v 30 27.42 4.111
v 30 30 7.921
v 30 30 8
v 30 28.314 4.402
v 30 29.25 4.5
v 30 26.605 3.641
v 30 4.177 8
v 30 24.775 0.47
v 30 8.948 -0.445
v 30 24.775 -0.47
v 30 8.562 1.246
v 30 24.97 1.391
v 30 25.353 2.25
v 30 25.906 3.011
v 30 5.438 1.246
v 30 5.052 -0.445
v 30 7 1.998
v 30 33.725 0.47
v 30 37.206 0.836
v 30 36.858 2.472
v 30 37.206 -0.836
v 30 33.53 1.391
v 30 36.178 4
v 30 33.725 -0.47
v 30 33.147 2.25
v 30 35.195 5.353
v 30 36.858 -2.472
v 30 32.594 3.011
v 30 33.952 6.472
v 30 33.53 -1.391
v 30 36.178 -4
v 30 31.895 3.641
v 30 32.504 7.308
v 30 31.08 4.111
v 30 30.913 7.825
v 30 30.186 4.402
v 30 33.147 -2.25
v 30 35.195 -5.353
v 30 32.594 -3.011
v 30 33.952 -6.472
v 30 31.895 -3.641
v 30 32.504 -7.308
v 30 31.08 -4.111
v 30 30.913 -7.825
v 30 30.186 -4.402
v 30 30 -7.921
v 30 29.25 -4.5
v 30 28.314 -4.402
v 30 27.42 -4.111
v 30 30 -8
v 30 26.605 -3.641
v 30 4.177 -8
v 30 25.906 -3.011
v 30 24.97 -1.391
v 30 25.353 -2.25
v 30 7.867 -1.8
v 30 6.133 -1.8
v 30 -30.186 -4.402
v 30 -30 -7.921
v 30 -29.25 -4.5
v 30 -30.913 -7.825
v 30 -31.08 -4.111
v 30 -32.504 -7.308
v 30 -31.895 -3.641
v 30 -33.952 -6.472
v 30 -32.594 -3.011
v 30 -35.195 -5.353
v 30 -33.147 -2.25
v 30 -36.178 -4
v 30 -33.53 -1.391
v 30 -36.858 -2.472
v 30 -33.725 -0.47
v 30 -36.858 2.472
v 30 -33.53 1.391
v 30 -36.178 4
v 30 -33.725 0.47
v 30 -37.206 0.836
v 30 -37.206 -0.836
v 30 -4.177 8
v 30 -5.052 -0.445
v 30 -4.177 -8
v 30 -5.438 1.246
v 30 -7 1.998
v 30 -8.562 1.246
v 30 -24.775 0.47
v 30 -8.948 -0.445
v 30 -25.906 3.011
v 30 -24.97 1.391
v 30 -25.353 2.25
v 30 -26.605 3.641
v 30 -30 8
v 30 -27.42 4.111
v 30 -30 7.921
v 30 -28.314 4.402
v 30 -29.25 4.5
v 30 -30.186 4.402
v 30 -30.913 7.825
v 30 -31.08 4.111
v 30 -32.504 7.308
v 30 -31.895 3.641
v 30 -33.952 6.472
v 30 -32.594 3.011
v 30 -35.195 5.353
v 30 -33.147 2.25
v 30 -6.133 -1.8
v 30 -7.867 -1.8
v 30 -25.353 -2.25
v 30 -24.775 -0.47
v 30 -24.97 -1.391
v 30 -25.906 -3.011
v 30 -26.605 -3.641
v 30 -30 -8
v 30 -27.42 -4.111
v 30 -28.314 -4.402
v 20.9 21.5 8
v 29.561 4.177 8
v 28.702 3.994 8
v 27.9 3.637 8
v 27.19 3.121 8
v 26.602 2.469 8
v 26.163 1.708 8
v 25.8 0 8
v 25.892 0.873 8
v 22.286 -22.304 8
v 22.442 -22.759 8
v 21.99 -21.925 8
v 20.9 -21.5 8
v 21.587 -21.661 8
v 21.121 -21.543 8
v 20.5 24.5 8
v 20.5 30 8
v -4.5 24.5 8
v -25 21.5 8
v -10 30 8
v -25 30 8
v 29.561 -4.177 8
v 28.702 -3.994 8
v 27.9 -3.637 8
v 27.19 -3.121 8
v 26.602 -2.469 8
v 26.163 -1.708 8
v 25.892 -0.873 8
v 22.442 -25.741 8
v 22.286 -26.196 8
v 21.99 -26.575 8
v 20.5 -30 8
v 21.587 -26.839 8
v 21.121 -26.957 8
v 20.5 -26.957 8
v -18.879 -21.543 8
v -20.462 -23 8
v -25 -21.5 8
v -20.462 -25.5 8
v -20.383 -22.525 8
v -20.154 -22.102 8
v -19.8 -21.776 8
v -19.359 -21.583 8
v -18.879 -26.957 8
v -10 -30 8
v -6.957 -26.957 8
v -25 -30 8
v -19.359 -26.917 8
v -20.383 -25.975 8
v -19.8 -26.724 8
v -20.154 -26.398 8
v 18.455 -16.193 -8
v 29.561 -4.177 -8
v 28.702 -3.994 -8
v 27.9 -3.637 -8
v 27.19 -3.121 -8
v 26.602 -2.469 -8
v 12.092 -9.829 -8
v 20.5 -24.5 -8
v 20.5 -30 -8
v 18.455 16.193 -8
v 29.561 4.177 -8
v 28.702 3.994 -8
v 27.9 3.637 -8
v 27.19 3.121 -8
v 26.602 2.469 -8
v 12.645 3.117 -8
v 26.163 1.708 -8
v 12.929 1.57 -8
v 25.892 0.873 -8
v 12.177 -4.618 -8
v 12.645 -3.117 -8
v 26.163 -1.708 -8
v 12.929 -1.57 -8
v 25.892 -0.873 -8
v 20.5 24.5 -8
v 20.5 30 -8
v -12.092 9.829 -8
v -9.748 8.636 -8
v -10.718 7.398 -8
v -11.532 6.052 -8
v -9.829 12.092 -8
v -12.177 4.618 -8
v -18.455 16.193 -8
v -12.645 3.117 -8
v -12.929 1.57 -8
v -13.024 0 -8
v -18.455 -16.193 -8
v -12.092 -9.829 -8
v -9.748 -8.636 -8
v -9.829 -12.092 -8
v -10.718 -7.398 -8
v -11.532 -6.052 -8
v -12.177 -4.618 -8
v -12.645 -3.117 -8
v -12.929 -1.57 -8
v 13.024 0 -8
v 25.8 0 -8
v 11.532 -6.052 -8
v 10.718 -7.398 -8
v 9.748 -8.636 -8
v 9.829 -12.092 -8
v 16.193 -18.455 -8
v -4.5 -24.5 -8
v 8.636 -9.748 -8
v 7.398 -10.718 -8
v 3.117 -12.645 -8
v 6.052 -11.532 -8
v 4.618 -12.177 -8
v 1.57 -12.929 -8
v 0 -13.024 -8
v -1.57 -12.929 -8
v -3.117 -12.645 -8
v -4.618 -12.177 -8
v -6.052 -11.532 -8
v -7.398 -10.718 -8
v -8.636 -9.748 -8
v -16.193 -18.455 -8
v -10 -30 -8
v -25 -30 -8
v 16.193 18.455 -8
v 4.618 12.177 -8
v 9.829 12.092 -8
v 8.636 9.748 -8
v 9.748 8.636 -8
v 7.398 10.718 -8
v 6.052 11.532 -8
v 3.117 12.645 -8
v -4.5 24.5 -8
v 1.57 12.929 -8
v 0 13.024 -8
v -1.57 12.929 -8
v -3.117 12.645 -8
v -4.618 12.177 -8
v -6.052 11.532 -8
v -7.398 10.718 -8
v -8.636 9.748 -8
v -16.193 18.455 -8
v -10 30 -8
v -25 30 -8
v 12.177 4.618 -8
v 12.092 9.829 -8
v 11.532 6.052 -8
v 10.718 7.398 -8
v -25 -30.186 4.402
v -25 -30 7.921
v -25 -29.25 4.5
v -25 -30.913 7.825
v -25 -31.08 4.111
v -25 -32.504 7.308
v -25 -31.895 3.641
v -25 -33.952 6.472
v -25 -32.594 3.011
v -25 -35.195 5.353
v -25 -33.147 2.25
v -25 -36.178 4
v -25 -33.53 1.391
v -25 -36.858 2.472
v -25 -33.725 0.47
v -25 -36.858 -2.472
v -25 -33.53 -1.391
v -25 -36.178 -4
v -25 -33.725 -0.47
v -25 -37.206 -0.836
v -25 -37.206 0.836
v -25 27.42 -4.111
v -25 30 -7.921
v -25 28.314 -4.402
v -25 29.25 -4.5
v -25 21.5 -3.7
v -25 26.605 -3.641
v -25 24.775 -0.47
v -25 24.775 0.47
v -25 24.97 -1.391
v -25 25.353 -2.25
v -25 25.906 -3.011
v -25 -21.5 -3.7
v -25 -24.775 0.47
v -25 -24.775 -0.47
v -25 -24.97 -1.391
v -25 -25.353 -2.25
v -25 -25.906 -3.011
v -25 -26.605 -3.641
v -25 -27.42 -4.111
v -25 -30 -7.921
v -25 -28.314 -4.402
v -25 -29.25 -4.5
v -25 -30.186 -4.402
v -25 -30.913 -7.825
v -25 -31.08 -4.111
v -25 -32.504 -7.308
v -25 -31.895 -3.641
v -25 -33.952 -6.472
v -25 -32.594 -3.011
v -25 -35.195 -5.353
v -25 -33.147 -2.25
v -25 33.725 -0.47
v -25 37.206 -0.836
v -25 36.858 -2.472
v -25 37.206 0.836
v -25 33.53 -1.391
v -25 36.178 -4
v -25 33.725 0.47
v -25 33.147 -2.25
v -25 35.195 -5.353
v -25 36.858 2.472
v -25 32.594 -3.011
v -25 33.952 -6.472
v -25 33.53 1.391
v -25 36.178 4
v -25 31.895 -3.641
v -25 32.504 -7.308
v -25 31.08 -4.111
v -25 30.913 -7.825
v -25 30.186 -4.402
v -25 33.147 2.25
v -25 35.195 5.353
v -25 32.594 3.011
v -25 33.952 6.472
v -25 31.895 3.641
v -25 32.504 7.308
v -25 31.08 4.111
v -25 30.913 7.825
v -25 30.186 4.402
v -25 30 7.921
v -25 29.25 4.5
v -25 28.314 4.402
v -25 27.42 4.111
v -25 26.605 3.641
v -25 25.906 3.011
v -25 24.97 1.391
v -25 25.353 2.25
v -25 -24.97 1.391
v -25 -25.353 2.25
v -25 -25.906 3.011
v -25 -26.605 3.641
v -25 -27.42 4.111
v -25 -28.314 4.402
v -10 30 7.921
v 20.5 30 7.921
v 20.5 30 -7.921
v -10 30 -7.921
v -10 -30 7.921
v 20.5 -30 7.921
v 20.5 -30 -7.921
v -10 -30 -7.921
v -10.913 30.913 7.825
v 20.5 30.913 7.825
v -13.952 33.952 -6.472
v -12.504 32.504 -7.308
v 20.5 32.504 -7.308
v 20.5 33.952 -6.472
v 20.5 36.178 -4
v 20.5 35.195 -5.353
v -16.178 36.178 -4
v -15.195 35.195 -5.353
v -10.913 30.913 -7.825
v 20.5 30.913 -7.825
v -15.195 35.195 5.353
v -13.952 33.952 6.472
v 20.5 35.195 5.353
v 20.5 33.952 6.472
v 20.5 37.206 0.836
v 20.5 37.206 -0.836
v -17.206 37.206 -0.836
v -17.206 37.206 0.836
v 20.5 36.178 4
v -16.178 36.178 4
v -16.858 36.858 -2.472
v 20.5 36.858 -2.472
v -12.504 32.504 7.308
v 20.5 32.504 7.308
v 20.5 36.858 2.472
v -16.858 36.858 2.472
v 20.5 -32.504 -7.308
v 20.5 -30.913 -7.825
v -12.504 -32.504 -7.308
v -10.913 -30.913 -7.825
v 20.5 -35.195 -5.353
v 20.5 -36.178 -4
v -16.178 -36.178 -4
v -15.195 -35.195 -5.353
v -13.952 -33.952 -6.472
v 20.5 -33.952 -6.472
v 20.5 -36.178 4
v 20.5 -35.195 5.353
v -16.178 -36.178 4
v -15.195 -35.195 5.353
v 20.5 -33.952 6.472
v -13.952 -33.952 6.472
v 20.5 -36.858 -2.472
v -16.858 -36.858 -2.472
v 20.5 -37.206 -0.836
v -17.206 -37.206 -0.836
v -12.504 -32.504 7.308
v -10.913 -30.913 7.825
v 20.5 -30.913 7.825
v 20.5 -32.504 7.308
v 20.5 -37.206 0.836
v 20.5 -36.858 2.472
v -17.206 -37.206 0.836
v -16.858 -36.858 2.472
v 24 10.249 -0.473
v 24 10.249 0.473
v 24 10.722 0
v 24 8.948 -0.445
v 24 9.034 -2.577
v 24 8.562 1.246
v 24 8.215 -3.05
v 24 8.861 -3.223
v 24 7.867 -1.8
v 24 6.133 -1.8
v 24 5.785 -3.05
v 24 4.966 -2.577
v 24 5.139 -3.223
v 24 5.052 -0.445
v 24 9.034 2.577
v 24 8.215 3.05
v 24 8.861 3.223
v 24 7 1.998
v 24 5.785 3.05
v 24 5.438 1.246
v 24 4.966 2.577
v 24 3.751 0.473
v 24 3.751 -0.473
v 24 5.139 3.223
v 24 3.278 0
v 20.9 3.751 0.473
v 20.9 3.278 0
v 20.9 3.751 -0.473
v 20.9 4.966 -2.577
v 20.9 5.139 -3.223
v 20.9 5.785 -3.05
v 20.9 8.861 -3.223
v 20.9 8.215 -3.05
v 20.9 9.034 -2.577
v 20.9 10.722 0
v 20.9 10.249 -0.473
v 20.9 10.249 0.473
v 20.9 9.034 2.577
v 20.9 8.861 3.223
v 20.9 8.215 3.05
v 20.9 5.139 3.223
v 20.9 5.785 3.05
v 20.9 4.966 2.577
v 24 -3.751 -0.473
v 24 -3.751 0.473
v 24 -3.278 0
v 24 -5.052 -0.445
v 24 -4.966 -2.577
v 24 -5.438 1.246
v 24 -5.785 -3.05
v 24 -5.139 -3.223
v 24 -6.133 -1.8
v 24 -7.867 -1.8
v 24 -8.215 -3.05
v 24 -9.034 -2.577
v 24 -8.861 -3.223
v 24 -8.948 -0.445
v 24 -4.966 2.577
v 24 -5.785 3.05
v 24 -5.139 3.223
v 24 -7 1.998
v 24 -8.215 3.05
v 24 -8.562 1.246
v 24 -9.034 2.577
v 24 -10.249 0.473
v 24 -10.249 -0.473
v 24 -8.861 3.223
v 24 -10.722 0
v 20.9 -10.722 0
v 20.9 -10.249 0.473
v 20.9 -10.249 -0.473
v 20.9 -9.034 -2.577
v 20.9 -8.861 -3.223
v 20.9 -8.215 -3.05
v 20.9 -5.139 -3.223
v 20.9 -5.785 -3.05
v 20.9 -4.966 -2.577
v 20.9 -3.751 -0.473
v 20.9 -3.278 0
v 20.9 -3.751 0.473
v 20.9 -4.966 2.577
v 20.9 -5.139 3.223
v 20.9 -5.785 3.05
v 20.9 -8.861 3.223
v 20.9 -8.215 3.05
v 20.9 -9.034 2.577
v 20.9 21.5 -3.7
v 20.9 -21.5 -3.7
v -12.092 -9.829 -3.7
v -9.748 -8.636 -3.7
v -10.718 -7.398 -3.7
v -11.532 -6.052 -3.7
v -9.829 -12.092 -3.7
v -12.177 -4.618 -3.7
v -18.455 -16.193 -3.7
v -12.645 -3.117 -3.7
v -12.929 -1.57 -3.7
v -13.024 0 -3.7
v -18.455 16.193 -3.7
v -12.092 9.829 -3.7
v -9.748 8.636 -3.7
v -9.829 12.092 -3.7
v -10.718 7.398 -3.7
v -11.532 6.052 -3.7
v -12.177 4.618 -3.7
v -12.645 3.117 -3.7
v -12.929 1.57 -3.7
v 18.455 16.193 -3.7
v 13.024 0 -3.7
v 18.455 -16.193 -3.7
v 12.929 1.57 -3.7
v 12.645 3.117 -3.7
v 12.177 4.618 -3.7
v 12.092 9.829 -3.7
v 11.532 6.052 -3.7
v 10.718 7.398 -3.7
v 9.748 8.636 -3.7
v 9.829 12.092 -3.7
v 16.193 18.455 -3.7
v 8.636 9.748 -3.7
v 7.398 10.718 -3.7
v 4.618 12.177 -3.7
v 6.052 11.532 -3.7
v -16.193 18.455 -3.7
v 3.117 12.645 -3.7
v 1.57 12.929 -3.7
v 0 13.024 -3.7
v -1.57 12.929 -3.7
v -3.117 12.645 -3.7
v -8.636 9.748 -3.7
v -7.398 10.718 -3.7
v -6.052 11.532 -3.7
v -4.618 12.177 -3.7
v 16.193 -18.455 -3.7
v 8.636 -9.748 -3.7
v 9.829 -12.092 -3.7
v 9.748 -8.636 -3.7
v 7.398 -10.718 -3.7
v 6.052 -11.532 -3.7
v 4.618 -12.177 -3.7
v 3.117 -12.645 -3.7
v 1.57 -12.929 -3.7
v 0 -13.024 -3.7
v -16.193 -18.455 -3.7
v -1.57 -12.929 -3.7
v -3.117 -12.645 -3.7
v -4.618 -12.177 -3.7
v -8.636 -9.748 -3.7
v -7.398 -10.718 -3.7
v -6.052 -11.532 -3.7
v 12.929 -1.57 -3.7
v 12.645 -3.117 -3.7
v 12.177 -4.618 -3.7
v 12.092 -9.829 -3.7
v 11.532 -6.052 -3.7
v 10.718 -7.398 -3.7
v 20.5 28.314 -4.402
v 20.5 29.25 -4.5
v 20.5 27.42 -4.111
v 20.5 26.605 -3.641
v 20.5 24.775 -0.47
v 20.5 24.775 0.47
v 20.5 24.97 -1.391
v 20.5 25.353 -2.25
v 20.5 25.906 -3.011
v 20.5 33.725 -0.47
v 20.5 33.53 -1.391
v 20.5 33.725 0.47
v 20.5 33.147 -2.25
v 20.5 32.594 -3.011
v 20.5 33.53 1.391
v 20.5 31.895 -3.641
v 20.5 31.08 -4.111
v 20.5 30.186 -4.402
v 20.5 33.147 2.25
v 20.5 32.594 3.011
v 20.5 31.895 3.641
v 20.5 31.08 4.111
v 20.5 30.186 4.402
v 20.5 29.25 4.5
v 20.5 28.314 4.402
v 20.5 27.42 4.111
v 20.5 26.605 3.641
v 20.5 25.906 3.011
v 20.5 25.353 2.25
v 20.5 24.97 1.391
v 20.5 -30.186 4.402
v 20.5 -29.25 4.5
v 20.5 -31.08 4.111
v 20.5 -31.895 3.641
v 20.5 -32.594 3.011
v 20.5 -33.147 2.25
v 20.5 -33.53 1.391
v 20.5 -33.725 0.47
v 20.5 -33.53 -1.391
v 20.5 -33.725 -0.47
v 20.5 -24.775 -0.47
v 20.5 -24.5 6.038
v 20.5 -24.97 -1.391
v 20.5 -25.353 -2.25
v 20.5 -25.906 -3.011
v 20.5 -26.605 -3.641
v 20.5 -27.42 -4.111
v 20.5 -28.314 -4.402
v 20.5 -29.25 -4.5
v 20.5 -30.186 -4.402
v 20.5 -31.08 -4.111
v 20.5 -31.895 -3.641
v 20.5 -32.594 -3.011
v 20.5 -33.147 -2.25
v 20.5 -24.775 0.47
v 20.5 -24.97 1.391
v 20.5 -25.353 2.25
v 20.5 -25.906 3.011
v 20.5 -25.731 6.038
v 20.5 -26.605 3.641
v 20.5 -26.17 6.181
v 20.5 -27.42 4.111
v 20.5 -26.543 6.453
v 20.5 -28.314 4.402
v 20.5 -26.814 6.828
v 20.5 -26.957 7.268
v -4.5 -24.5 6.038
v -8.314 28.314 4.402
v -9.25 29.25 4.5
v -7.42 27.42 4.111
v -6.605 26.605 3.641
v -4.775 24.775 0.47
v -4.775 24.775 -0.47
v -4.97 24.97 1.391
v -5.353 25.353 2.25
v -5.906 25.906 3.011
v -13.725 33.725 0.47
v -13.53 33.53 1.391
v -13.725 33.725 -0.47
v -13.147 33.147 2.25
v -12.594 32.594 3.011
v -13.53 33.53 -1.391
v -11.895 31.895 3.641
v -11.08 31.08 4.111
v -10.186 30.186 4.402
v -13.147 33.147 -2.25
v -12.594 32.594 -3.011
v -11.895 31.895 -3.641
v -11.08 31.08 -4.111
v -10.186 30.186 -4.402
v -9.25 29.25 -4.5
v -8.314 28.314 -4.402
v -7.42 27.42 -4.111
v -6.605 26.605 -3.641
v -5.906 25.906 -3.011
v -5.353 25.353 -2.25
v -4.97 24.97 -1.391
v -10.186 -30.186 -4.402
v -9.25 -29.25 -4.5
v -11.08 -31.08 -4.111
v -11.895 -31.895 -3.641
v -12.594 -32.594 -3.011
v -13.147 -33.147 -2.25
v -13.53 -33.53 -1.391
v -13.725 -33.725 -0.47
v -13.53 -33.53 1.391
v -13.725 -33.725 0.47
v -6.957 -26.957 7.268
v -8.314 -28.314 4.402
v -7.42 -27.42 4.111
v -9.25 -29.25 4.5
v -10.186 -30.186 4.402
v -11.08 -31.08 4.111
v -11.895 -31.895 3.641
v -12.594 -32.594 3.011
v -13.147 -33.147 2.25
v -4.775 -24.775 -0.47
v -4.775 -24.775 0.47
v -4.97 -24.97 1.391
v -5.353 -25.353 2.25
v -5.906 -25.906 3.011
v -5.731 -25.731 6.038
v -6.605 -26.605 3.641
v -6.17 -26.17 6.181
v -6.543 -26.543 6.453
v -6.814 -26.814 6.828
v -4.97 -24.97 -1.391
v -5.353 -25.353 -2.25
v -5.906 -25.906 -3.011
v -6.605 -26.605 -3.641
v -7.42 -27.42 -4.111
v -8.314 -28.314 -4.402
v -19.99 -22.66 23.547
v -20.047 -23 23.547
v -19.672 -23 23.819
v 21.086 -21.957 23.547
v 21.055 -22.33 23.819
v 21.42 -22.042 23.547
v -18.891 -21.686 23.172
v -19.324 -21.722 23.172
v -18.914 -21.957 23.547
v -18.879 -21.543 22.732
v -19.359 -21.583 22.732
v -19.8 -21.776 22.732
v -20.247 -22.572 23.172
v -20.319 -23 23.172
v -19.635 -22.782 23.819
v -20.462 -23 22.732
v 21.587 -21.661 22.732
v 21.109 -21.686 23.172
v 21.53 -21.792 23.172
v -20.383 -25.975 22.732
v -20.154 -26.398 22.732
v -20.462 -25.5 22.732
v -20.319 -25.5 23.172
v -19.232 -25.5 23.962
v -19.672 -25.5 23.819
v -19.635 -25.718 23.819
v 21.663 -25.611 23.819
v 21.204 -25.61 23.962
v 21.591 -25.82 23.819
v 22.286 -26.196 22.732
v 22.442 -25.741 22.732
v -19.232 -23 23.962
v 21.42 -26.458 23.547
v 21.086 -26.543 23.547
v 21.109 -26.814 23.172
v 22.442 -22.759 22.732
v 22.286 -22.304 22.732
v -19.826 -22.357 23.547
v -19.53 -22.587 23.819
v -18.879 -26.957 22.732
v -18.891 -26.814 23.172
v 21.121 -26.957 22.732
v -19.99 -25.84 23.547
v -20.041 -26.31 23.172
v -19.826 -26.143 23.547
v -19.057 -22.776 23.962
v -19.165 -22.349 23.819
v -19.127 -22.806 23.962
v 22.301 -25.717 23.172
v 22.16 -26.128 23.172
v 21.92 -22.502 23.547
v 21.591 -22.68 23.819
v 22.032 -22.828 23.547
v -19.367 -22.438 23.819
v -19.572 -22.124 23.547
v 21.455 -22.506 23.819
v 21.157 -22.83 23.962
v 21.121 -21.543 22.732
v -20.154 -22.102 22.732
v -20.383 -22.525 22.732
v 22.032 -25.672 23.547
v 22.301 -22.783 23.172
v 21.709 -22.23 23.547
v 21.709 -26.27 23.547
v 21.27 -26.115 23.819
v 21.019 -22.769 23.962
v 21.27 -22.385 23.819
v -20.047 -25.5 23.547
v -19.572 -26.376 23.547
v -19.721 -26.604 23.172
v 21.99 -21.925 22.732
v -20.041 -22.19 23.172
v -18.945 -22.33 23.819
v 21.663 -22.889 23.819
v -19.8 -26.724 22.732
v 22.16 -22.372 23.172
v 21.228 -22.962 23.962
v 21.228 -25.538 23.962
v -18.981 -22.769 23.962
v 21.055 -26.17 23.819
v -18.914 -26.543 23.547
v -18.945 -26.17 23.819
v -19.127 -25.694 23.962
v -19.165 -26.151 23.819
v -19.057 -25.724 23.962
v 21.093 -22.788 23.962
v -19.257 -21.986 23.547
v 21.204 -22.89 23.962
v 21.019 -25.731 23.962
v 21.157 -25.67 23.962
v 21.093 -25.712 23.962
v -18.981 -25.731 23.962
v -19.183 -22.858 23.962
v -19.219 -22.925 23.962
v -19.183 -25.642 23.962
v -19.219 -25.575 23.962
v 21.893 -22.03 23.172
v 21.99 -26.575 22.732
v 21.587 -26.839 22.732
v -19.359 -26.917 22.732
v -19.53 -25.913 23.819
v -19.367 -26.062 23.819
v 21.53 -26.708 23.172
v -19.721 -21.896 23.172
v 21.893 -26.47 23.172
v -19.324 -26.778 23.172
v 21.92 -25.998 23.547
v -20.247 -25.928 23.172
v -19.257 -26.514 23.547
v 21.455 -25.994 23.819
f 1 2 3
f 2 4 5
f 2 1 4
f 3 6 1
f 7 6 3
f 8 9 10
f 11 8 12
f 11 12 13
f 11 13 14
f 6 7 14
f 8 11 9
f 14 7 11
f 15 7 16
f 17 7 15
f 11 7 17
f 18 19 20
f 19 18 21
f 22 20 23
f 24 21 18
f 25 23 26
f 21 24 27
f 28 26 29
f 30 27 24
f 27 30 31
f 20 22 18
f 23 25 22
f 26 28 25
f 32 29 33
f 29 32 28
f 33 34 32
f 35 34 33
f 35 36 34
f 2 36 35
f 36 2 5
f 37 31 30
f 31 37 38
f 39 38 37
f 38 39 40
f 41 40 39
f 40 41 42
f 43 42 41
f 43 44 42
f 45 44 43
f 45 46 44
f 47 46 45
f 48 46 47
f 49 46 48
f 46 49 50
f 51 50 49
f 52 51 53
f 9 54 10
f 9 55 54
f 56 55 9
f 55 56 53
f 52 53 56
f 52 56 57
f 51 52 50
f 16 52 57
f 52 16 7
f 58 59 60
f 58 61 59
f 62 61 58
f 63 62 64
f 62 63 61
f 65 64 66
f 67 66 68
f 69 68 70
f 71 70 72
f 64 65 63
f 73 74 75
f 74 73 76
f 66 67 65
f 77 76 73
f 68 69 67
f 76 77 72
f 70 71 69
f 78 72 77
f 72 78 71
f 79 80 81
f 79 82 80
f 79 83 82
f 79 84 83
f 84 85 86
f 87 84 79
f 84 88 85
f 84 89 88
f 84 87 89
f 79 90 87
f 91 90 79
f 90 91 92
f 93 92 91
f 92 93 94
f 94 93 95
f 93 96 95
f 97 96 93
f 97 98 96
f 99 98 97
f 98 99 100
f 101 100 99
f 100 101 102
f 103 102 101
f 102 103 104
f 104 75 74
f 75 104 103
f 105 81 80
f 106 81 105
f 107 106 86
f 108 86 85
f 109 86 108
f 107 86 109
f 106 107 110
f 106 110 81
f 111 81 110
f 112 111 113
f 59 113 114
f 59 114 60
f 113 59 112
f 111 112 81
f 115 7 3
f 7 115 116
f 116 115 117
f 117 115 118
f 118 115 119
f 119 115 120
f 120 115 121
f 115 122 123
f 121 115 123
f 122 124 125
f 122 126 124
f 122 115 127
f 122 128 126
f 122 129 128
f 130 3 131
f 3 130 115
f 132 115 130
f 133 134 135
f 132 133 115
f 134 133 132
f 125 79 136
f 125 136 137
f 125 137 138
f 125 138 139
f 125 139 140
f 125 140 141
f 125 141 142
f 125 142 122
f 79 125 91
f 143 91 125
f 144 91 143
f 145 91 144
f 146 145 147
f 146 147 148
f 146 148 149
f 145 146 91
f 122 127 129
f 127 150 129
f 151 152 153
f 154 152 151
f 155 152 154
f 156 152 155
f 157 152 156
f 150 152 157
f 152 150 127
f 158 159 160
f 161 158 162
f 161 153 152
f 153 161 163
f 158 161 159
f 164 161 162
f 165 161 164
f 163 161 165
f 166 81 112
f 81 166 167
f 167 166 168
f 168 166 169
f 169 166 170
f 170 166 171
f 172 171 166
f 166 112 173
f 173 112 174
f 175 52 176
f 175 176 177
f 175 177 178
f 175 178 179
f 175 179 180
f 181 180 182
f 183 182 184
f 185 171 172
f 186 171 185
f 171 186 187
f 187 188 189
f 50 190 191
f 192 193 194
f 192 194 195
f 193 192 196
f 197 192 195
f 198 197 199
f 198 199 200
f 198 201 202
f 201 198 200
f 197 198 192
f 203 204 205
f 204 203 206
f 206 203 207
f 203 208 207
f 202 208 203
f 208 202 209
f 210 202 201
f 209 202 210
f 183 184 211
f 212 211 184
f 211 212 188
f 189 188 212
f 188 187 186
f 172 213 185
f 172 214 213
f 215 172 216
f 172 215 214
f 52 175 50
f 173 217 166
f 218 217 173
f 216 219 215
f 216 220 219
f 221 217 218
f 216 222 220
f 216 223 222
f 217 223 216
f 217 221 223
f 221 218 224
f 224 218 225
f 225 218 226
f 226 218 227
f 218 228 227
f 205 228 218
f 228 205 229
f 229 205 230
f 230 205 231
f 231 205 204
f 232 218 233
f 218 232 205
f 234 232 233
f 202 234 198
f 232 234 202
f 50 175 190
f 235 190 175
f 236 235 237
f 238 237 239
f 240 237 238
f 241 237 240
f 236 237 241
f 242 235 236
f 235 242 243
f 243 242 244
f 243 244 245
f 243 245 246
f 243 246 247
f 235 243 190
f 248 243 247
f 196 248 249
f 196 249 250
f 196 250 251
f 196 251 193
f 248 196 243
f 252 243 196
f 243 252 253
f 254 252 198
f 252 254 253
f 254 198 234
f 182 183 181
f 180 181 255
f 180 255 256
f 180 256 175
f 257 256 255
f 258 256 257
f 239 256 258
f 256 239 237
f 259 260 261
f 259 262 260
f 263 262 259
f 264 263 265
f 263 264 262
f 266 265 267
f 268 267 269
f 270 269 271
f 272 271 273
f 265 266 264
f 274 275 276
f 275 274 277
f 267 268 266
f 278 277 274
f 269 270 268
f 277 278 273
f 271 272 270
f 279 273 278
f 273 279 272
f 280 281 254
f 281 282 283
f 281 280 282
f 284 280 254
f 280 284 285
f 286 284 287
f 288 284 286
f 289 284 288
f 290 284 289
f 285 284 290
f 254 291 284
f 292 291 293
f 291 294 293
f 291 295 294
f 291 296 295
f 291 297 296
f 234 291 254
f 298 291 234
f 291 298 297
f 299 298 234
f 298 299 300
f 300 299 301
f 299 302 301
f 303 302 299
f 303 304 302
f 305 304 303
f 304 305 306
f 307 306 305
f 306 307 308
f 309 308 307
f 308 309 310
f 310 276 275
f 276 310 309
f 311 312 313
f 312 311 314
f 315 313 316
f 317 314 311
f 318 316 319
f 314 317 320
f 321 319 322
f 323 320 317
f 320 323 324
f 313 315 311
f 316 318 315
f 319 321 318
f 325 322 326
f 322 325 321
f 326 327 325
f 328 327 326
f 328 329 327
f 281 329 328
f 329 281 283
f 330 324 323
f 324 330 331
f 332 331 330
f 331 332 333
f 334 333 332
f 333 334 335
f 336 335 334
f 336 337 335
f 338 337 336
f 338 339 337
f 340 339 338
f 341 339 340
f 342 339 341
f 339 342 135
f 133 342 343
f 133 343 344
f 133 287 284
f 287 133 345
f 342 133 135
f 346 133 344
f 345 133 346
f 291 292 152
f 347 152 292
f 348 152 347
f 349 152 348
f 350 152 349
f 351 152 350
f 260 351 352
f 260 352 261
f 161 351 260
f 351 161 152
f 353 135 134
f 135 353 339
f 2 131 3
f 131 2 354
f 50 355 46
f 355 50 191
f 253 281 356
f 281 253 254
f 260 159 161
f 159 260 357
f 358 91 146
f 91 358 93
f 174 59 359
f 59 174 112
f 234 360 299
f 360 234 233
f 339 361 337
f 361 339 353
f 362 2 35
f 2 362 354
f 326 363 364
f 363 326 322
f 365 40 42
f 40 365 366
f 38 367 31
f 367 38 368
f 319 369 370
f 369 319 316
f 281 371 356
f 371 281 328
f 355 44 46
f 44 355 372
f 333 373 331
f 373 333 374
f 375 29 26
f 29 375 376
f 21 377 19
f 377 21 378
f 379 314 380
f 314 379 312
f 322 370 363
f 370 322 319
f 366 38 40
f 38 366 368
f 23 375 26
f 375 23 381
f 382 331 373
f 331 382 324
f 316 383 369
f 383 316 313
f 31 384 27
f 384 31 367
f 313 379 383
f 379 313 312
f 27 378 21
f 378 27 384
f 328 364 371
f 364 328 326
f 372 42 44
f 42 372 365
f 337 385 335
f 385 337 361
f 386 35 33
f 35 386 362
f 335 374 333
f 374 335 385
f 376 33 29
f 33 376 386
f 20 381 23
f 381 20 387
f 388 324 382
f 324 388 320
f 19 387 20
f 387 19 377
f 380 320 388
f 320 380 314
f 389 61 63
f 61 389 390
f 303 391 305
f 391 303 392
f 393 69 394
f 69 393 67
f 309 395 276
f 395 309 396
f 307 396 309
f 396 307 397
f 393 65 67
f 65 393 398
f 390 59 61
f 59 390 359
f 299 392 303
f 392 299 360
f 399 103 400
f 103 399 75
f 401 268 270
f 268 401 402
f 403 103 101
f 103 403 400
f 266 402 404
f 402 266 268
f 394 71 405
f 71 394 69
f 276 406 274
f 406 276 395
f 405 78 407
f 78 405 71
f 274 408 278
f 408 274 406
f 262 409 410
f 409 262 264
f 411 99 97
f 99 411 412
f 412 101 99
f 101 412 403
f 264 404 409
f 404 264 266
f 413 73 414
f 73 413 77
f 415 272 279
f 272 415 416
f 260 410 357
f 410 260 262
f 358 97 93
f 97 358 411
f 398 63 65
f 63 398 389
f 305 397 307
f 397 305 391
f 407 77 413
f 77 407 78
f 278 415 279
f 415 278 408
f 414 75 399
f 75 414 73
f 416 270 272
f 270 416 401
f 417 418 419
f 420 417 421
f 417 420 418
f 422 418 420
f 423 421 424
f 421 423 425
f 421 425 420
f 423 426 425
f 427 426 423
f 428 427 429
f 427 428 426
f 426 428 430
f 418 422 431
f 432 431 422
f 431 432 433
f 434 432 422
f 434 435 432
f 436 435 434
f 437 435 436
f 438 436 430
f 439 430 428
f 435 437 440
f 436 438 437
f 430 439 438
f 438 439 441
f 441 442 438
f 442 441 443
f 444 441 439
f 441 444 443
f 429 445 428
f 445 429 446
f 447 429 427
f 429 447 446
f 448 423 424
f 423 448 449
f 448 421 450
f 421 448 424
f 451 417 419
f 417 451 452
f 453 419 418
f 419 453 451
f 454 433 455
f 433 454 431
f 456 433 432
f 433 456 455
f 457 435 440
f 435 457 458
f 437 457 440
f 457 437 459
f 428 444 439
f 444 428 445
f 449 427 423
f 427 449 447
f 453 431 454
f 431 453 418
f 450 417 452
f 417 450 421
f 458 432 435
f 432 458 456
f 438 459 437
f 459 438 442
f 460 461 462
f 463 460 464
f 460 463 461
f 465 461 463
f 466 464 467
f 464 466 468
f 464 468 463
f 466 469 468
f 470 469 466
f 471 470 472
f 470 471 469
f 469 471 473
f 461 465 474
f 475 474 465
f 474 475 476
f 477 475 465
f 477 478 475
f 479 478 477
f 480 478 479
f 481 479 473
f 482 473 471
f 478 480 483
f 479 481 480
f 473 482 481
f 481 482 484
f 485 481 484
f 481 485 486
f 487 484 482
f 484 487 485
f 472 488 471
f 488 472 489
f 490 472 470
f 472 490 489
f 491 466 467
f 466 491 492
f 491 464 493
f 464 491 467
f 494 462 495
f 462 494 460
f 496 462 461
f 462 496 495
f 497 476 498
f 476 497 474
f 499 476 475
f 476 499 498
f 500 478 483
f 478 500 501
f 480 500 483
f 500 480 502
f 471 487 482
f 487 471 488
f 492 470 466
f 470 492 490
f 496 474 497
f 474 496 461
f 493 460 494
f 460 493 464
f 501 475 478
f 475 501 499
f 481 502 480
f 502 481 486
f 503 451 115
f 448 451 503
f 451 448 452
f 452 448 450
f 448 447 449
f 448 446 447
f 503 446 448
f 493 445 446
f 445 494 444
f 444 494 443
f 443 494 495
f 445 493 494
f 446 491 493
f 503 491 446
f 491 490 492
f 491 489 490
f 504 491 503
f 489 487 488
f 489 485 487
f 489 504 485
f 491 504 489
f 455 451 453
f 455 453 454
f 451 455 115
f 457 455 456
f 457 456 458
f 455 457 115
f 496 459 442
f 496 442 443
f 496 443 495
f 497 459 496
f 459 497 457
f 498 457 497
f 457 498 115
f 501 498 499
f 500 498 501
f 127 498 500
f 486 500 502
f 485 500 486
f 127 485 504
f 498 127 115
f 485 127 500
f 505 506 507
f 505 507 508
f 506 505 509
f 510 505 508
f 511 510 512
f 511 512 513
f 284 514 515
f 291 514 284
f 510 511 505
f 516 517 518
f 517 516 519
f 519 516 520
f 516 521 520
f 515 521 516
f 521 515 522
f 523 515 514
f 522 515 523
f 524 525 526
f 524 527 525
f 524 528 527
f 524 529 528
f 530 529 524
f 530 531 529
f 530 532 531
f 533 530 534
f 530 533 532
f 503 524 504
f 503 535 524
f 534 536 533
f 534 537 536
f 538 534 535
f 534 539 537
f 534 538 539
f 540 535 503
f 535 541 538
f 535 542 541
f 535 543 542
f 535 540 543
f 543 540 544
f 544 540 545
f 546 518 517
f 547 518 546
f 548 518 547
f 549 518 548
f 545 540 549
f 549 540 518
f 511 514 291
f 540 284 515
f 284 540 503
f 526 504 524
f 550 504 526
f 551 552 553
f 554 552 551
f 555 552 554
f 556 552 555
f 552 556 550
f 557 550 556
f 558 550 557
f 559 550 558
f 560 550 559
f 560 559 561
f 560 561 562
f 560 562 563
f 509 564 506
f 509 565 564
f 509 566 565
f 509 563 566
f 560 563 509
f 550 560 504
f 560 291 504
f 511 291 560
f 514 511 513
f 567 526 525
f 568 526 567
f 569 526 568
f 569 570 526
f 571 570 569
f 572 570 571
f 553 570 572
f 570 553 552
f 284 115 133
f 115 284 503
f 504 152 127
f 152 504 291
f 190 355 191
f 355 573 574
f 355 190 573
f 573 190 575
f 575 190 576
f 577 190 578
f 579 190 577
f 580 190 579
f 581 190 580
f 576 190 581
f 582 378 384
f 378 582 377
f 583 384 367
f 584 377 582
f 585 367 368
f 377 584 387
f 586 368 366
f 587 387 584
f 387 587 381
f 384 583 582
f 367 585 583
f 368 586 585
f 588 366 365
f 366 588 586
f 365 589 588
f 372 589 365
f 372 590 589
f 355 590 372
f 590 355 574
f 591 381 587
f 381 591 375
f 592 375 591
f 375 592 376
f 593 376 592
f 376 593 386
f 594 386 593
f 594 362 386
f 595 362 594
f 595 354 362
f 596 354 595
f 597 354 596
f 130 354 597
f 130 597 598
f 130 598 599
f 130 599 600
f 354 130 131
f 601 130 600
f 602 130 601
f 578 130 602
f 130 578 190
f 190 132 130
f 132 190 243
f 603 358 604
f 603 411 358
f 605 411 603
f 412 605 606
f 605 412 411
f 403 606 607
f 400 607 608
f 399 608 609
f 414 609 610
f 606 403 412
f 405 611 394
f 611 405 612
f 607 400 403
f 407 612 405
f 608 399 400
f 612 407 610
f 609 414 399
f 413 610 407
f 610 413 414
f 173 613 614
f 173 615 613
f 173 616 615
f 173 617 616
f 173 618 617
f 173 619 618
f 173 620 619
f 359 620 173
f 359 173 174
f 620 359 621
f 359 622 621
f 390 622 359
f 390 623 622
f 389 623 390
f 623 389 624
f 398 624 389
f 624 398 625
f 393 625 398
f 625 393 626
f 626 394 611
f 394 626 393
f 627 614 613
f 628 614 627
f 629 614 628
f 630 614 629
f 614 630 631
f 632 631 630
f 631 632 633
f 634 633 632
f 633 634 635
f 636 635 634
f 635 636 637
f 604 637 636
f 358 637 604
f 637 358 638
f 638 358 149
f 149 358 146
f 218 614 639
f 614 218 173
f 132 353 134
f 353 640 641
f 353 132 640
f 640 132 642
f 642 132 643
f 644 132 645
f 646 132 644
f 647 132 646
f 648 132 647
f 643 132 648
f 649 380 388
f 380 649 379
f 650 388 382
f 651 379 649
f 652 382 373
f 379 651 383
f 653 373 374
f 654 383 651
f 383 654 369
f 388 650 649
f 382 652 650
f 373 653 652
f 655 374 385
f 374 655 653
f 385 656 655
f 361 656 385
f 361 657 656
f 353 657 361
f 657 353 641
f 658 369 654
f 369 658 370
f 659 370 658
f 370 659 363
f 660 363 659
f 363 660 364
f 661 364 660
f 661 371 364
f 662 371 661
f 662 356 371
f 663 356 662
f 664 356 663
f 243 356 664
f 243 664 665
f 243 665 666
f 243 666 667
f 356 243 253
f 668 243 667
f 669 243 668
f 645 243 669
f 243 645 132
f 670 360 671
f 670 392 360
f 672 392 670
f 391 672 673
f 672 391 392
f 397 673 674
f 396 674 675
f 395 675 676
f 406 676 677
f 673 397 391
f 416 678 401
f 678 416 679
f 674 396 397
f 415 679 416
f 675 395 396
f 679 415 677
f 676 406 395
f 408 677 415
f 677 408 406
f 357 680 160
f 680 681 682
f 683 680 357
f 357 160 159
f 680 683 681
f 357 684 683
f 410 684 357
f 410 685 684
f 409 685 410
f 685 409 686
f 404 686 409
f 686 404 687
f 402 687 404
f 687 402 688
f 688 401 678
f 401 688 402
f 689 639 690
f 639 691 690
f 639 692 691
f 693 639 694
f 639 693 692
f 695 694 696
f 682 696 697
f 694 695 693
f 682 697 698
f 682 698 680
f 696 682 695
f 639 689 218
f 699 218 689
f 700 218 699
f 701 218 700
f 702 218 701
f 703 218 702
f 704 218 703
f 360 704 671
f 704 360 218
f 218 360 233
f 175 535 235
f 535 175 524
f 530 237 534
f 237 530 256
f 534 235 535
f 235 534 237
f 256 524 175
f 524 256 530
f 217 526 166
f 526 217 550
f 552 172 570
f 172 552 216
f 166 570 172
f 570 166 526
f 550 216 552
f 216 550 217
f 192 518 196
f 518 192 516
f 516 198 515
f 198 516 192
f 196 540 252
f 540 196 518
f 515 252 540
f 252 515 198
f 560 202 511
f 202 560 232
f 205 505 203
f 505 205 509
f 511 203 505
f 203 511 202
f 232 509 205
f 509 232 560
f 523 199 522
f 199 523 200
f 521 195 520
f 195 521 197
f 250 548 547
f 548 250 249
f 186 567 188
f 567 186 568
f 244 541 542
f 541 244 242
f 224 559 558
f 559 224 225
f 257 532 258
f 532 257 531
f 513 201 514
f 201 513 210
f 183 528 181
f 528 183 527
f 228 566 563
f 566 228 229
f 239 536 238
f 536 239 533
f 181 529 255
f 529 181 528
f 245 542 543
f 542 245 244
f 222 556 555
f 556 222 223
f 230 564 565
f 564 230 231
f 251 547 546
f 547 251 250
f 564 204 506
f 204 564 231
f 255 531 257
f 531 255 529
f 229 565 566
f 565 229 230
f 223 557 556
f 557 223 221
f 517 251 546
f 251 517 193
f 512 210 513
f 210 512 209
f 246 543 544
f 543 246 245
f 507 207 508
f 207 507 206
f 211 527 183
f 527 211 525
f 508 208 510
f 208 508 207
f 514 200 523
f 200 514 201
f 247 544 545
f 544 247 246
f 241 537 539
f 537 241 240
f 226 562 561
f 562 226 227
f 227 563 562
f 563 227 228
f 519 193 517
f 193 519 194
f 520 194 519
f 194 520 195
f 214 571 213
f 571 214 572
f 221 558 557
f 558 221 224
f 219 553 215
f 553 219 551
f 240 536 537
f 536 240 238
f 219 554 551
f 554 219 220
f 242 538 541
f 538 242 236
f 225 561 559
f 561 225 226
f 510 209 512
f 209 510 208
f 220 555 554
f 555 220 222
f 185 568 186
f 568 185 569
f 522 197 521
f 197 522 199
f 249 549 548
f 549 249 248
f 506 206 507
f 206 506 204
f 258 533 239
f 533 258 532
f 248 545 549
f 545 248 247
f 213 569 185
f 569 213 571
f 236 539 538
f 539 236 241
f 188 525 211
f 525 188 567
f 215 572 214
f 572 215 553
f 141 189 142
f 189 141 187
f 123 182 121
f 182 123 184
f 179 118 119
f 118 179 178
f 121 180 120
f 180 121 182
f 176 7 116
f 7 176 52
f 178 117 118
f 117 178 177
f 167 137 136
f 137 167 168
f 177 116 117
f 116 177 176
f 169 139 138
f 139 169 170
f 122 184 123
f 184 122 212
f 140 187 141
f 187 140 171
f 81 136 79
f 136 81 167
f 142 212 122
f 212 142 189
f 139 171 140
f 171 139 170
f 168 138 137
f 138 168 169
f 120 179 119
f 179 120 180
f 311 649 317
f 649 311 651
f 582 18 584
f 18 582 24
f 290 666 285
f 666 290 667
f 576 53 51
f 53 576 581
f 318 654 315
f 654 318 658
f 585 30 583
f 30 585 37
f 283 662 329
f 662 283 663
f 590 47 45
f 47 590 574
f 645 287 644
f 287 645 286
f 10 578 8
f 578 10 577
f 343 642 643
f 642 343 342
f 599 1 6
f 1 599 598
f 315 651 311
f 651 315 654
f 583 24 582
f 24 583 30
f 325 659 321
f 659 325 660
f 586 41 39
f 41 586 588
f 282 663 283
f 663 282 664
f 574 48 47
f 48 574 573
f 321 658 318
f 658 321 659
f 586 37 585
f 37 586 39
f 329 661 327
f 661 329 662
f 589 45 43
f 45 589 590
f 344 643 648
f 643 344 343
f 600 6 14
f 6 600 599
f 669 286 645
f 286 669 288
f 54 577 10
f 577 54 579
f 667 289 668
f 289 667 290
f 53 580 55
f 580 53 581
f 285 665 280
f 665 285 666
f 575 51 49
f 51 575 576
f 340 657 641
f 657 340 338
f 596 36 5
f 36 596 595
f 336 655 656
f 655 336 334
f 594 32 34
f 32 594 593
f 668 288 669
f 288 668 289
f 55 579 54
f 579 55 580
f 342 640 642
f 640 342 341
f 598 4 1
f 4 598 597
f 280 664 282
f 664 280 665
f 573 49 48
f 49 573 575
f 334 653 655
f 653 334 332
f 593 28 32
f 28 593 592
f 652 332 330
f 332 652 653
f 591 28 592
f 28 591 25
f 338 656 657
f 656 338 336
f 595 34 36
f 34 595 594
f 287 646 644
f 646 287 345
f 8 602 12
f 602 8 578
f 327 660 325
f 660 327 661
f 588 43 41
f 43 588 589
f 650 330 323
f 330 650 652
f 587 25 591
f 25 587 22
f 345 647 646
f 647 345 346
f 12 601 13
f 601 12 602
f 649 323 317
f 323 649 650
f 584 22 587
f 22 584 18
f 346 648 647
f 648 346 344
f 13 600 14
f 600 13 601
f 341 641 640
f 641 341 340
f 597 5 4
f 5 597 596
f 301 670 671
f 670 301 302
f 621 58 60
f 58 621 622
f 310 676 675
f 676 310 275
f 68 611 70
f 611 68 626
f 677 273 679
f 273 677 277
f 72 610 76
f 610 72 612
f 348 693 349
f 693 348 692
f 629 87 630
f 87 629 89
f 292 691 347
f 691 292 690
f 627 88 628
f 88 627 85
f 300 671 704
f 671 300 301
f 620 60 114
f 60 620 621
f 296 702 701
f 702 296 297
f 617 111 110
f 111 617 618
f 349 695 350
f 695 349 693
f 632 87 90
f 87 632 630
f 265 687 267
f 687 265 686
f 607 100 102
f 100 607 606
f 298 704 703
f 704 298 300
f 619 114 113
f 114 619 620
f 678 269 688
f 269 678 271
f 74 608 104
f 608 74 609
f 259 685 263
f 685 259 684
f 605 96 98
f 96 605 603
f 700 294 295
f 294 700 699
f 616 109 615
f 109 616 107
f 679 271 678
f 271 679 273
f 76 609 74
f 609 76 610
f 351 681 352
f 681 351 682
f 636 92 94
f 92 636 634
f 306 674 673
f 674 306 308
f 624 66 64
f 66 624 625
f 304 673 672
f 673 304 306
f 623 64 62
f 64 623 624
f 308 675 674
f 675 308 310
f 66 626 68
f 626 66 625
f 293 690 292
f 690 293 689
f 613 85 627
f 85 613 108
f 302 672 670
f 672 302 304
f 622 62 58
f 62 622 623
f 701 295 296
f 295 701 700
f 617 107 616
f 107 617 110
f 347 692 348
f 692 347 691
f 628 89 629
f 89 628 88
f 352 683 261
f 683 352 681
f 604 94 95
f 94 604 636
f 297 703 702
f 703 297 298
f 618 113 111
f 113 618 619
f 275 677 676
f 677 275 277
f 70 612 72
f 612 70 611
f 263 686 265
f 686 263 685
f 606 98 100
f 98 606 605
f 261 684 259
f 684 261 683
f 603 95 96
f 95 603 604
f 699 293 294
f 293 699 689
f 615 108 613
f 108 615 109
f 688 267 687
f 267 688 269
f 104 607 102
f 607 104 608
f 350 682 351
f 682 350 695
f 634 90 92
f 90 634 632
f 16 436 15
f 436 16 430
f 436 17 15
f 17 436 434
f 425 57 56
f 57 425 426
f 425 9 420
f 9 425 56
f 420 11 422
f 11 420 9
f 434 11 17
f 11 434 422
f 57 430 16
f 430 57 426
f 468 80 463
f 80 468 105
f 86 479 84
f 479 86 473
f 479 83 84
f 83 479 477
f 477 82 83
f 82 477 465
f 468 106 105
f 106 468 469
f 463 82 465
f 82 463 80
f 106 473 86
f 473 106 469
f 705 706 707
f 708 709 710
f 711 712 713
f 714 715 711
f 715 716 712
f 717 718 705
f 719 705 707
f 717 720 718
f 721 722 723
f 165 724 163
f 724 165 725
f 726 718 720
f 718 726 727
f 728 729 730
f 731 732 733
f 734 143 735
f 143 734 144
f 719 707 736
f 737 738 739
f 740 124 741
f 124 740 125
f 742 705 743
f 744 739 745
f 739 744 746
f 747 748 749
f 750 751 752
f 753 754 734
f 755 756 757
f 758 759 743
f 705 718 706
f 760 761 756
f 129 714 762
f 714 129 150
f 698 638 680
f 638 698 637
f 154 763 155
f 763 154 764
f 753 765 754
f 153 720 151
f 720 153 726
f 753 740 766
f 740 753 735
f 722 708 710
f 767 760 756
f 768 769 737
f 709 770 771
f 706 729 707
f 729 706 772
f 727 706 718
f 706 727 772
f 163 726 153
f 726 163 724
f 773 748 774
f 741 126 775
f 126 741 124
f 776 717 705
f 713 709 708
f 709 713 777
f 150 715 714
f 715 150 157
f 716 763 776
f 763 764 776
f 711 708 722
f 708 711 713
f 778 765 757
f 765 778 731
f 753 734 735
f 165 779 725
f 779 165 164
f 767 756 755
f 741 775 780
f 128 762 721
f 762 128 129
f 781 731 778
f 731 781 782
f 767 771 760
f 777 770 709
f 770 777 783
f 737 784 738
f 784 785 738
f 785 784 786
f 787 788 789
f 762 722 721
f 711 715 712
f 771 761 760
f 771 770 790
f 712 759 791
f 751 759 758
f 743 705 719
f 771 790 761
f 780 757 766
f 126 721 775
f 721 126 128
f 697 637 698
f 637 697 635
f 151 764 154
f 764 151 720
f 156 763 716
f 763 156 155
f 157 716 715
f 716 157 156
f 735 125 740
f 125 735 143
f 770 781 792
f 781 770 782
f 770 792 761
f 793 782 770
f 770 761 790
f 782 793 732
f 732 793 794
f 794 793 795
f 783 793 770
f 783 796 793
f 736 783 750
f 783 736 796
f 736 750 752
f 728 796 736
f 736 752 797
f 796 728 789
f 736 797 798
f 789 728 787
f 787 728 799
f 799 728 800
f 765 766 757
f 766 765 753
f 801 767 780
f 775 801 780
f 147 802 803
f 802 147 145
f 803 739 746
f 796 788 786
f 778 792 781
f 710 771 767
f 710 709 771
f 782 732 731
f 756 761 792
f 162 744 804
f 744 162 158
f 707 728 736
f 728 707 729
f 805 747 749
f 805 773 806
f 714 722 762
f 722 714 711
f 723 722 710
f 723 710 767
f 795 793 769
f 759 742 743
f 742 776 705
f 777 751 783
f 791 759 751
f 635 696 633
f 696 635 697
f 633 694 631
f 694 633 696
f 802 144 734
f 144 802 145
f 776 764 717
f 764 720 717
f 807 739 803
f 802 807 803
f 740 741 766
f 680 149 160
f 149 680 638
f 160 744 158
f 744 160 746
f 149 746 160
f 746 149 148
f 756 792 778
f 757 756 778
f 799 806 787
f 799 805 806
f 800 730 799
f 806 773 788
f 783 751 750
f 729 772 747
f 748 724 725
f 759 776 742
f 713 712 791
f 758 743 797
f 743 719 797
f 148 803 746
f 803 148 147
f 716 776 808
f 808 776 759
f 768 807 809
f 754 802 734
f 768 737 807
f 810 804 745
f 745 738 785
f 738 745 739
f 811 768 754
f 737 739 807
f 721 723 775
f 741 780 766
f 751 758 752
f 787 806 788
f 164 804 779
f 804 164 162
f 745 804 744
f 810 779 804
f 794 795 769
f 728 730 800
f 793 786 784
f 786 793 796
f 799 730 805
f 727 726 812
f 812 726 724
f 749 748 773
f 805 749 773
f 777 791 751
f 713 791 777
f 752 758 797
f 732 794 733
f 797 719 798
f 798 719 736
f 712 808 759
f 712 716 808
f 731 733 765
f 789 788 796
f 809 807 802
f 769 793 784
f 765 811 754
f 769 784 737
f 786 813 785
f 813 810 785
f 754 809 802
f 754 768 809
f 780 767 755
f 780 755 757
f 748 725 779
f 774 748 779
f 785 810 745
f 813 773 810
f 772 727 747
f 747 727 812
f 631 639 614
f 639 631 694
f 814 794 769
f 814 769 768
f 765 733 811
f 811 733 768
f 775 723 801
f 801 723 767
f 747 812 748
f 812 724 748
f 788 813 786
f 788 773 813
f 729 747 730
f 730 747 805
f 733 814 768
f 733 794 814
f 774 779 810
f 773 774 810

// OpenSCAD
// file: functions.scad
// PRUSA Mendel  
// Functions used in many files
// GNU GPL v2
// Josef Průša
// josefprusa@me.com
// prusadjs.cz
// http://www.reprap.org/wiki/Prusa_Mendel
// http://github.com/prusajr/PrusaMendel

module nut( d, h, horizontal = true )
{
	cornerdiameter = ( d / 2 ) / cos( 180 / 6 );
	cylinder( h = h, r = cornerdiameter, $fn = 6 );
	if( horizontal )
	{
		for( i = [1 : 6] )
		{
			rotate( [0, 0, 60 * i] ) translate( [-cornerdiameter - 0.2, 0, 0] ) rotate( [0, 0, -45] ) cube( size = [2, 2, h] );
		}
	}
}

// By nophead
module polyhole( d, h ) 
{
	n = max( round( 2 * d ), 3 );
	rotate( [0, 0, 180] ) cylinder( h = h, r = ( d / 2 ) / cos( 180 / n ), $fn = n );
}

module roundcorner( diameter )
{
	difference()
	{
		cube( size = [diameter, diameter, 99], center = false );
		translate( v = [diameter, diameter, 0] ) cylinder( h = 100, r = diameter, center = true );
	}
}
// file: metric.scad
// PRUSA Mendel  
// Default metric sizes
// GNU GPL v2
// Josef Průša
// josefprusa@me.com
// prusadjs.cz
// http://www.reprap.org/wiki/Prusa_Mendel
// http://github.com/prusajr/PrusaMendel

// DONT CHANGE THIS FILE! ALTER VALUES IN CONFIGURATION.SCAD INSTEAD

// RODS

threaded_rod_diameter = 8.2;
threaded_rod_diameter_horizontal = 8.2;
smooth_bar_diameter = 8;
smooth_bar_diameter_horizontal = 8.5;

// Nuts and bolts
// Nut diameters are flat to flat

m8_diameter = 9;
m8_nut_diameter = 16.4;
m8_nut_thickness = 6.5;

m4_diameter = 4.5;
m4_nut_diameter = 9;
m4_nut_thickness = 3.2;

m3_diameter = 3.6;
m3_nut_diameter = 6.1;
m3_nut_thickness = 2.4;

// Bushing holder

bushing_core_diameter = smooth_bar_diameter;
bushing_material_thickness = 1;

// Motors

motor_shaft = 5.5;
// file: configuration.scad
// PRUSA Mendel  
// Configuration file
// GNU GPL v2
// Josef Průša
// josefprusa@me.com
// prusadjs.cz
// http://www.reprap.org/wiki/Prusa_Mendel
// http://github.com/prusajr/PrusaMendel

// PLEASE SELECT ONE OF THE CONFIGURATIONS BELOW
// BY UN-COMMENTING IT

// Uncomment for metric settings
// METRIC METRIC METRIC METRIC METRIC METRIC METRIC METRIC 

include <metric.scad>;

// Uncomment for imperial settings
// IMPERIAL IMPERIAL IMPERIAL IMPERIAL IMPERIAL IMPERIAL IMPERIAL 

//include <sae.scad>;

// CUSTOM CUSTOM CUSTOM CUSTOM CUSTOM CUSTOM CUSTOM CUSTOM CUSTOM

thin_wall = 3;

// LM8UU
linear = false;


// CHANGE ONLY THE STUFF YOU KNOW
// IT WILL REPLACE DEFAULT SETTING

// RODS

// threaded_rod_diameter = 0;
// threaded_rod_diameter_horizontal = 0;
// smooth_bar_díameter = 0;
// smooth_bar_díameter_horizontal = 0;

// Nuts and bolts

// m8_diameter = 0;
// m8_nut_diameter = 0;
// m8_nut_thickness = 0;

// m4_diameter = 0;
 m4_nut_diameter = 8.5;
// m4_nut_thickness = 0;

// m3_diameter = 0;
// m3_nut_diameter = 0;
m3_nut_thickness = 3;

// Bushing holder

// bushing_core_diameter = smooth_bar_díameter;
// bushing_material_thickness = 0;


///counted stuff
m3_nut_diameter_bigger = ((m3_nut_diameter  / 2) / cos (180 / 6))*2;

// functions 
include <functions.scad>
// main file
// PRUSA Mendel  
// Z motor mount
// Used for mounting Z motors
// GNU GPL v2
// Josef Průša
// josefprusa@me.com
// prusadjs.cz
// http://www.reprap.org/wiki/Prusa_Mendel
// http://github.com/prusajr/PrusaMendel
include <configuration.scad>
include <OpenScadFont.scad>


/**
 * @id z-motor-mount
 * @name Z motor mount
 * @category Printed
 * @using 2 m3x25xhex
 * @using 2 m3nut
 * @using 2 m3washer
 * @using 4 m8nut
 * @using 4 m8washer
 * @using 1 rod-clamp
 */


 $fs=0.5;
Side="left";					// Mounted on 'left' or 'right'
Plaque_type="Logo";			// Include either the 'Logo' or 'Serial'

Logo_Source="TVRR.dxf";		// Source file for Logo
Serial=["0","1","#","0","1"];		// Number for Serial




module zmotormount(){
difference(){
union(){
translate(v=[2.5,0,0]) cube(size = [55,60,16], center = true);
translate(v=[2.5,0,-4]) cube(size = [55,74.5-16,8], center = true);
translate(v=[-25,29.25,0]) rotate(a=[0,90,0]) cylinder(h = 55, r=8, $fn=30);
translate(v=[-25,-29.25,0]) rotate(a=[0,90,0]) cylinder(h = 55, r=8, $fn=30);
}
translate(v=[-2.1,0,2.8]) cube(size = [46,43,13], center = true);

// reducing the material
translate(v=[10.5-2.5,34.5,-4]) cube(size = [25,20,30], center = true);
translate(v=[10.5-2.5,-34.5,-4]) cube(size = [25,20,30], center = true);
translate(v=[-10,0,0]) translate(v=[5.5,24.5,-10]) rotate(a=[0,0,45]) cube(size = [20,20,30]);
translate(v=[-10,0,0]) translate(v=[5.5,-24.5,-10]) rotate(a=[0,0,225]) cube(size = [20,20,30]);

// Nema 17
rotate ([0,0,45]) translate([20,0,0]) cube(size = [9,3.2,25], center = true);
rotate ([0,0,-45]) translate([20,0,0]) cube(size = [9,3.2,25], center = true);
rotate ([0,0,135]) translate([20,0,0]) cube(size = [9,3.2,25], center = true);
rotate ([0,0,-135]) translate([20,0,0]) cube(size = [9,3.2,25], center = true);
translate(v=[0,0,-10])polyhole(26,20);

translate(v=[30,0,-10]) cylinder(h = 20, r=4.2);
translate(v=[-26,29.25,0]) rotate(a=[0,90,0]) cylinder(h = 58, r=m8_diameter/2);
translate(v=[-26,-29.25,0]) rotate(a=[0,90,0]) cylinder(h = 58, r=m8_diameter/2);


translate(v=[16,7,0]) rotate(a=[0,90,0]) polyhole(m3_diameter,15);
translate(v=[16,-7,0]) rotate(a=[0,90,0]) polyhole(m3_diameter,15);
translate(v=[0,7,0]) rotate(a=[0,90,0]) rotate(a=[0,0,30]) nut(m3_nut_diameter, 24, true);
translate(v=[0,-7,0]) rotate(a=[0,90,0]) rotate(a=[0,0,30]) nut(m3_nut_diameter, 24, true);

}
}

module plaque(){


		difference(){
			minkowski(){
				cube([40,2.5,15],center=true);
				translate([0,0,00]){sphere(r=1.48);}
			}
		if (Plaque_type=="Logo"){rotate([90,0,180]){translate([-17.5,-6.5,3]){scale([0.75,0.75,1]){linear_extrude(file=Logo_Source, height=5, center=true);}}}}
		if (Plaque_type=="Serial") { translate([12,0.5,0]) rotate([-90,90,0]) scale([1.25,1.25,1]) fnt_str(Serial,5,1,5);}
		}
}

union(){
	zmotormount();
	if (Side=="left")	{ translate([1,-24.25,15])	{rotate([0,0,180])	{plaque();}}}
	if (Side=="right") 	{ translate([1,24.25,15])	{rotate([0,0,000])	{plaque();}}}
}
